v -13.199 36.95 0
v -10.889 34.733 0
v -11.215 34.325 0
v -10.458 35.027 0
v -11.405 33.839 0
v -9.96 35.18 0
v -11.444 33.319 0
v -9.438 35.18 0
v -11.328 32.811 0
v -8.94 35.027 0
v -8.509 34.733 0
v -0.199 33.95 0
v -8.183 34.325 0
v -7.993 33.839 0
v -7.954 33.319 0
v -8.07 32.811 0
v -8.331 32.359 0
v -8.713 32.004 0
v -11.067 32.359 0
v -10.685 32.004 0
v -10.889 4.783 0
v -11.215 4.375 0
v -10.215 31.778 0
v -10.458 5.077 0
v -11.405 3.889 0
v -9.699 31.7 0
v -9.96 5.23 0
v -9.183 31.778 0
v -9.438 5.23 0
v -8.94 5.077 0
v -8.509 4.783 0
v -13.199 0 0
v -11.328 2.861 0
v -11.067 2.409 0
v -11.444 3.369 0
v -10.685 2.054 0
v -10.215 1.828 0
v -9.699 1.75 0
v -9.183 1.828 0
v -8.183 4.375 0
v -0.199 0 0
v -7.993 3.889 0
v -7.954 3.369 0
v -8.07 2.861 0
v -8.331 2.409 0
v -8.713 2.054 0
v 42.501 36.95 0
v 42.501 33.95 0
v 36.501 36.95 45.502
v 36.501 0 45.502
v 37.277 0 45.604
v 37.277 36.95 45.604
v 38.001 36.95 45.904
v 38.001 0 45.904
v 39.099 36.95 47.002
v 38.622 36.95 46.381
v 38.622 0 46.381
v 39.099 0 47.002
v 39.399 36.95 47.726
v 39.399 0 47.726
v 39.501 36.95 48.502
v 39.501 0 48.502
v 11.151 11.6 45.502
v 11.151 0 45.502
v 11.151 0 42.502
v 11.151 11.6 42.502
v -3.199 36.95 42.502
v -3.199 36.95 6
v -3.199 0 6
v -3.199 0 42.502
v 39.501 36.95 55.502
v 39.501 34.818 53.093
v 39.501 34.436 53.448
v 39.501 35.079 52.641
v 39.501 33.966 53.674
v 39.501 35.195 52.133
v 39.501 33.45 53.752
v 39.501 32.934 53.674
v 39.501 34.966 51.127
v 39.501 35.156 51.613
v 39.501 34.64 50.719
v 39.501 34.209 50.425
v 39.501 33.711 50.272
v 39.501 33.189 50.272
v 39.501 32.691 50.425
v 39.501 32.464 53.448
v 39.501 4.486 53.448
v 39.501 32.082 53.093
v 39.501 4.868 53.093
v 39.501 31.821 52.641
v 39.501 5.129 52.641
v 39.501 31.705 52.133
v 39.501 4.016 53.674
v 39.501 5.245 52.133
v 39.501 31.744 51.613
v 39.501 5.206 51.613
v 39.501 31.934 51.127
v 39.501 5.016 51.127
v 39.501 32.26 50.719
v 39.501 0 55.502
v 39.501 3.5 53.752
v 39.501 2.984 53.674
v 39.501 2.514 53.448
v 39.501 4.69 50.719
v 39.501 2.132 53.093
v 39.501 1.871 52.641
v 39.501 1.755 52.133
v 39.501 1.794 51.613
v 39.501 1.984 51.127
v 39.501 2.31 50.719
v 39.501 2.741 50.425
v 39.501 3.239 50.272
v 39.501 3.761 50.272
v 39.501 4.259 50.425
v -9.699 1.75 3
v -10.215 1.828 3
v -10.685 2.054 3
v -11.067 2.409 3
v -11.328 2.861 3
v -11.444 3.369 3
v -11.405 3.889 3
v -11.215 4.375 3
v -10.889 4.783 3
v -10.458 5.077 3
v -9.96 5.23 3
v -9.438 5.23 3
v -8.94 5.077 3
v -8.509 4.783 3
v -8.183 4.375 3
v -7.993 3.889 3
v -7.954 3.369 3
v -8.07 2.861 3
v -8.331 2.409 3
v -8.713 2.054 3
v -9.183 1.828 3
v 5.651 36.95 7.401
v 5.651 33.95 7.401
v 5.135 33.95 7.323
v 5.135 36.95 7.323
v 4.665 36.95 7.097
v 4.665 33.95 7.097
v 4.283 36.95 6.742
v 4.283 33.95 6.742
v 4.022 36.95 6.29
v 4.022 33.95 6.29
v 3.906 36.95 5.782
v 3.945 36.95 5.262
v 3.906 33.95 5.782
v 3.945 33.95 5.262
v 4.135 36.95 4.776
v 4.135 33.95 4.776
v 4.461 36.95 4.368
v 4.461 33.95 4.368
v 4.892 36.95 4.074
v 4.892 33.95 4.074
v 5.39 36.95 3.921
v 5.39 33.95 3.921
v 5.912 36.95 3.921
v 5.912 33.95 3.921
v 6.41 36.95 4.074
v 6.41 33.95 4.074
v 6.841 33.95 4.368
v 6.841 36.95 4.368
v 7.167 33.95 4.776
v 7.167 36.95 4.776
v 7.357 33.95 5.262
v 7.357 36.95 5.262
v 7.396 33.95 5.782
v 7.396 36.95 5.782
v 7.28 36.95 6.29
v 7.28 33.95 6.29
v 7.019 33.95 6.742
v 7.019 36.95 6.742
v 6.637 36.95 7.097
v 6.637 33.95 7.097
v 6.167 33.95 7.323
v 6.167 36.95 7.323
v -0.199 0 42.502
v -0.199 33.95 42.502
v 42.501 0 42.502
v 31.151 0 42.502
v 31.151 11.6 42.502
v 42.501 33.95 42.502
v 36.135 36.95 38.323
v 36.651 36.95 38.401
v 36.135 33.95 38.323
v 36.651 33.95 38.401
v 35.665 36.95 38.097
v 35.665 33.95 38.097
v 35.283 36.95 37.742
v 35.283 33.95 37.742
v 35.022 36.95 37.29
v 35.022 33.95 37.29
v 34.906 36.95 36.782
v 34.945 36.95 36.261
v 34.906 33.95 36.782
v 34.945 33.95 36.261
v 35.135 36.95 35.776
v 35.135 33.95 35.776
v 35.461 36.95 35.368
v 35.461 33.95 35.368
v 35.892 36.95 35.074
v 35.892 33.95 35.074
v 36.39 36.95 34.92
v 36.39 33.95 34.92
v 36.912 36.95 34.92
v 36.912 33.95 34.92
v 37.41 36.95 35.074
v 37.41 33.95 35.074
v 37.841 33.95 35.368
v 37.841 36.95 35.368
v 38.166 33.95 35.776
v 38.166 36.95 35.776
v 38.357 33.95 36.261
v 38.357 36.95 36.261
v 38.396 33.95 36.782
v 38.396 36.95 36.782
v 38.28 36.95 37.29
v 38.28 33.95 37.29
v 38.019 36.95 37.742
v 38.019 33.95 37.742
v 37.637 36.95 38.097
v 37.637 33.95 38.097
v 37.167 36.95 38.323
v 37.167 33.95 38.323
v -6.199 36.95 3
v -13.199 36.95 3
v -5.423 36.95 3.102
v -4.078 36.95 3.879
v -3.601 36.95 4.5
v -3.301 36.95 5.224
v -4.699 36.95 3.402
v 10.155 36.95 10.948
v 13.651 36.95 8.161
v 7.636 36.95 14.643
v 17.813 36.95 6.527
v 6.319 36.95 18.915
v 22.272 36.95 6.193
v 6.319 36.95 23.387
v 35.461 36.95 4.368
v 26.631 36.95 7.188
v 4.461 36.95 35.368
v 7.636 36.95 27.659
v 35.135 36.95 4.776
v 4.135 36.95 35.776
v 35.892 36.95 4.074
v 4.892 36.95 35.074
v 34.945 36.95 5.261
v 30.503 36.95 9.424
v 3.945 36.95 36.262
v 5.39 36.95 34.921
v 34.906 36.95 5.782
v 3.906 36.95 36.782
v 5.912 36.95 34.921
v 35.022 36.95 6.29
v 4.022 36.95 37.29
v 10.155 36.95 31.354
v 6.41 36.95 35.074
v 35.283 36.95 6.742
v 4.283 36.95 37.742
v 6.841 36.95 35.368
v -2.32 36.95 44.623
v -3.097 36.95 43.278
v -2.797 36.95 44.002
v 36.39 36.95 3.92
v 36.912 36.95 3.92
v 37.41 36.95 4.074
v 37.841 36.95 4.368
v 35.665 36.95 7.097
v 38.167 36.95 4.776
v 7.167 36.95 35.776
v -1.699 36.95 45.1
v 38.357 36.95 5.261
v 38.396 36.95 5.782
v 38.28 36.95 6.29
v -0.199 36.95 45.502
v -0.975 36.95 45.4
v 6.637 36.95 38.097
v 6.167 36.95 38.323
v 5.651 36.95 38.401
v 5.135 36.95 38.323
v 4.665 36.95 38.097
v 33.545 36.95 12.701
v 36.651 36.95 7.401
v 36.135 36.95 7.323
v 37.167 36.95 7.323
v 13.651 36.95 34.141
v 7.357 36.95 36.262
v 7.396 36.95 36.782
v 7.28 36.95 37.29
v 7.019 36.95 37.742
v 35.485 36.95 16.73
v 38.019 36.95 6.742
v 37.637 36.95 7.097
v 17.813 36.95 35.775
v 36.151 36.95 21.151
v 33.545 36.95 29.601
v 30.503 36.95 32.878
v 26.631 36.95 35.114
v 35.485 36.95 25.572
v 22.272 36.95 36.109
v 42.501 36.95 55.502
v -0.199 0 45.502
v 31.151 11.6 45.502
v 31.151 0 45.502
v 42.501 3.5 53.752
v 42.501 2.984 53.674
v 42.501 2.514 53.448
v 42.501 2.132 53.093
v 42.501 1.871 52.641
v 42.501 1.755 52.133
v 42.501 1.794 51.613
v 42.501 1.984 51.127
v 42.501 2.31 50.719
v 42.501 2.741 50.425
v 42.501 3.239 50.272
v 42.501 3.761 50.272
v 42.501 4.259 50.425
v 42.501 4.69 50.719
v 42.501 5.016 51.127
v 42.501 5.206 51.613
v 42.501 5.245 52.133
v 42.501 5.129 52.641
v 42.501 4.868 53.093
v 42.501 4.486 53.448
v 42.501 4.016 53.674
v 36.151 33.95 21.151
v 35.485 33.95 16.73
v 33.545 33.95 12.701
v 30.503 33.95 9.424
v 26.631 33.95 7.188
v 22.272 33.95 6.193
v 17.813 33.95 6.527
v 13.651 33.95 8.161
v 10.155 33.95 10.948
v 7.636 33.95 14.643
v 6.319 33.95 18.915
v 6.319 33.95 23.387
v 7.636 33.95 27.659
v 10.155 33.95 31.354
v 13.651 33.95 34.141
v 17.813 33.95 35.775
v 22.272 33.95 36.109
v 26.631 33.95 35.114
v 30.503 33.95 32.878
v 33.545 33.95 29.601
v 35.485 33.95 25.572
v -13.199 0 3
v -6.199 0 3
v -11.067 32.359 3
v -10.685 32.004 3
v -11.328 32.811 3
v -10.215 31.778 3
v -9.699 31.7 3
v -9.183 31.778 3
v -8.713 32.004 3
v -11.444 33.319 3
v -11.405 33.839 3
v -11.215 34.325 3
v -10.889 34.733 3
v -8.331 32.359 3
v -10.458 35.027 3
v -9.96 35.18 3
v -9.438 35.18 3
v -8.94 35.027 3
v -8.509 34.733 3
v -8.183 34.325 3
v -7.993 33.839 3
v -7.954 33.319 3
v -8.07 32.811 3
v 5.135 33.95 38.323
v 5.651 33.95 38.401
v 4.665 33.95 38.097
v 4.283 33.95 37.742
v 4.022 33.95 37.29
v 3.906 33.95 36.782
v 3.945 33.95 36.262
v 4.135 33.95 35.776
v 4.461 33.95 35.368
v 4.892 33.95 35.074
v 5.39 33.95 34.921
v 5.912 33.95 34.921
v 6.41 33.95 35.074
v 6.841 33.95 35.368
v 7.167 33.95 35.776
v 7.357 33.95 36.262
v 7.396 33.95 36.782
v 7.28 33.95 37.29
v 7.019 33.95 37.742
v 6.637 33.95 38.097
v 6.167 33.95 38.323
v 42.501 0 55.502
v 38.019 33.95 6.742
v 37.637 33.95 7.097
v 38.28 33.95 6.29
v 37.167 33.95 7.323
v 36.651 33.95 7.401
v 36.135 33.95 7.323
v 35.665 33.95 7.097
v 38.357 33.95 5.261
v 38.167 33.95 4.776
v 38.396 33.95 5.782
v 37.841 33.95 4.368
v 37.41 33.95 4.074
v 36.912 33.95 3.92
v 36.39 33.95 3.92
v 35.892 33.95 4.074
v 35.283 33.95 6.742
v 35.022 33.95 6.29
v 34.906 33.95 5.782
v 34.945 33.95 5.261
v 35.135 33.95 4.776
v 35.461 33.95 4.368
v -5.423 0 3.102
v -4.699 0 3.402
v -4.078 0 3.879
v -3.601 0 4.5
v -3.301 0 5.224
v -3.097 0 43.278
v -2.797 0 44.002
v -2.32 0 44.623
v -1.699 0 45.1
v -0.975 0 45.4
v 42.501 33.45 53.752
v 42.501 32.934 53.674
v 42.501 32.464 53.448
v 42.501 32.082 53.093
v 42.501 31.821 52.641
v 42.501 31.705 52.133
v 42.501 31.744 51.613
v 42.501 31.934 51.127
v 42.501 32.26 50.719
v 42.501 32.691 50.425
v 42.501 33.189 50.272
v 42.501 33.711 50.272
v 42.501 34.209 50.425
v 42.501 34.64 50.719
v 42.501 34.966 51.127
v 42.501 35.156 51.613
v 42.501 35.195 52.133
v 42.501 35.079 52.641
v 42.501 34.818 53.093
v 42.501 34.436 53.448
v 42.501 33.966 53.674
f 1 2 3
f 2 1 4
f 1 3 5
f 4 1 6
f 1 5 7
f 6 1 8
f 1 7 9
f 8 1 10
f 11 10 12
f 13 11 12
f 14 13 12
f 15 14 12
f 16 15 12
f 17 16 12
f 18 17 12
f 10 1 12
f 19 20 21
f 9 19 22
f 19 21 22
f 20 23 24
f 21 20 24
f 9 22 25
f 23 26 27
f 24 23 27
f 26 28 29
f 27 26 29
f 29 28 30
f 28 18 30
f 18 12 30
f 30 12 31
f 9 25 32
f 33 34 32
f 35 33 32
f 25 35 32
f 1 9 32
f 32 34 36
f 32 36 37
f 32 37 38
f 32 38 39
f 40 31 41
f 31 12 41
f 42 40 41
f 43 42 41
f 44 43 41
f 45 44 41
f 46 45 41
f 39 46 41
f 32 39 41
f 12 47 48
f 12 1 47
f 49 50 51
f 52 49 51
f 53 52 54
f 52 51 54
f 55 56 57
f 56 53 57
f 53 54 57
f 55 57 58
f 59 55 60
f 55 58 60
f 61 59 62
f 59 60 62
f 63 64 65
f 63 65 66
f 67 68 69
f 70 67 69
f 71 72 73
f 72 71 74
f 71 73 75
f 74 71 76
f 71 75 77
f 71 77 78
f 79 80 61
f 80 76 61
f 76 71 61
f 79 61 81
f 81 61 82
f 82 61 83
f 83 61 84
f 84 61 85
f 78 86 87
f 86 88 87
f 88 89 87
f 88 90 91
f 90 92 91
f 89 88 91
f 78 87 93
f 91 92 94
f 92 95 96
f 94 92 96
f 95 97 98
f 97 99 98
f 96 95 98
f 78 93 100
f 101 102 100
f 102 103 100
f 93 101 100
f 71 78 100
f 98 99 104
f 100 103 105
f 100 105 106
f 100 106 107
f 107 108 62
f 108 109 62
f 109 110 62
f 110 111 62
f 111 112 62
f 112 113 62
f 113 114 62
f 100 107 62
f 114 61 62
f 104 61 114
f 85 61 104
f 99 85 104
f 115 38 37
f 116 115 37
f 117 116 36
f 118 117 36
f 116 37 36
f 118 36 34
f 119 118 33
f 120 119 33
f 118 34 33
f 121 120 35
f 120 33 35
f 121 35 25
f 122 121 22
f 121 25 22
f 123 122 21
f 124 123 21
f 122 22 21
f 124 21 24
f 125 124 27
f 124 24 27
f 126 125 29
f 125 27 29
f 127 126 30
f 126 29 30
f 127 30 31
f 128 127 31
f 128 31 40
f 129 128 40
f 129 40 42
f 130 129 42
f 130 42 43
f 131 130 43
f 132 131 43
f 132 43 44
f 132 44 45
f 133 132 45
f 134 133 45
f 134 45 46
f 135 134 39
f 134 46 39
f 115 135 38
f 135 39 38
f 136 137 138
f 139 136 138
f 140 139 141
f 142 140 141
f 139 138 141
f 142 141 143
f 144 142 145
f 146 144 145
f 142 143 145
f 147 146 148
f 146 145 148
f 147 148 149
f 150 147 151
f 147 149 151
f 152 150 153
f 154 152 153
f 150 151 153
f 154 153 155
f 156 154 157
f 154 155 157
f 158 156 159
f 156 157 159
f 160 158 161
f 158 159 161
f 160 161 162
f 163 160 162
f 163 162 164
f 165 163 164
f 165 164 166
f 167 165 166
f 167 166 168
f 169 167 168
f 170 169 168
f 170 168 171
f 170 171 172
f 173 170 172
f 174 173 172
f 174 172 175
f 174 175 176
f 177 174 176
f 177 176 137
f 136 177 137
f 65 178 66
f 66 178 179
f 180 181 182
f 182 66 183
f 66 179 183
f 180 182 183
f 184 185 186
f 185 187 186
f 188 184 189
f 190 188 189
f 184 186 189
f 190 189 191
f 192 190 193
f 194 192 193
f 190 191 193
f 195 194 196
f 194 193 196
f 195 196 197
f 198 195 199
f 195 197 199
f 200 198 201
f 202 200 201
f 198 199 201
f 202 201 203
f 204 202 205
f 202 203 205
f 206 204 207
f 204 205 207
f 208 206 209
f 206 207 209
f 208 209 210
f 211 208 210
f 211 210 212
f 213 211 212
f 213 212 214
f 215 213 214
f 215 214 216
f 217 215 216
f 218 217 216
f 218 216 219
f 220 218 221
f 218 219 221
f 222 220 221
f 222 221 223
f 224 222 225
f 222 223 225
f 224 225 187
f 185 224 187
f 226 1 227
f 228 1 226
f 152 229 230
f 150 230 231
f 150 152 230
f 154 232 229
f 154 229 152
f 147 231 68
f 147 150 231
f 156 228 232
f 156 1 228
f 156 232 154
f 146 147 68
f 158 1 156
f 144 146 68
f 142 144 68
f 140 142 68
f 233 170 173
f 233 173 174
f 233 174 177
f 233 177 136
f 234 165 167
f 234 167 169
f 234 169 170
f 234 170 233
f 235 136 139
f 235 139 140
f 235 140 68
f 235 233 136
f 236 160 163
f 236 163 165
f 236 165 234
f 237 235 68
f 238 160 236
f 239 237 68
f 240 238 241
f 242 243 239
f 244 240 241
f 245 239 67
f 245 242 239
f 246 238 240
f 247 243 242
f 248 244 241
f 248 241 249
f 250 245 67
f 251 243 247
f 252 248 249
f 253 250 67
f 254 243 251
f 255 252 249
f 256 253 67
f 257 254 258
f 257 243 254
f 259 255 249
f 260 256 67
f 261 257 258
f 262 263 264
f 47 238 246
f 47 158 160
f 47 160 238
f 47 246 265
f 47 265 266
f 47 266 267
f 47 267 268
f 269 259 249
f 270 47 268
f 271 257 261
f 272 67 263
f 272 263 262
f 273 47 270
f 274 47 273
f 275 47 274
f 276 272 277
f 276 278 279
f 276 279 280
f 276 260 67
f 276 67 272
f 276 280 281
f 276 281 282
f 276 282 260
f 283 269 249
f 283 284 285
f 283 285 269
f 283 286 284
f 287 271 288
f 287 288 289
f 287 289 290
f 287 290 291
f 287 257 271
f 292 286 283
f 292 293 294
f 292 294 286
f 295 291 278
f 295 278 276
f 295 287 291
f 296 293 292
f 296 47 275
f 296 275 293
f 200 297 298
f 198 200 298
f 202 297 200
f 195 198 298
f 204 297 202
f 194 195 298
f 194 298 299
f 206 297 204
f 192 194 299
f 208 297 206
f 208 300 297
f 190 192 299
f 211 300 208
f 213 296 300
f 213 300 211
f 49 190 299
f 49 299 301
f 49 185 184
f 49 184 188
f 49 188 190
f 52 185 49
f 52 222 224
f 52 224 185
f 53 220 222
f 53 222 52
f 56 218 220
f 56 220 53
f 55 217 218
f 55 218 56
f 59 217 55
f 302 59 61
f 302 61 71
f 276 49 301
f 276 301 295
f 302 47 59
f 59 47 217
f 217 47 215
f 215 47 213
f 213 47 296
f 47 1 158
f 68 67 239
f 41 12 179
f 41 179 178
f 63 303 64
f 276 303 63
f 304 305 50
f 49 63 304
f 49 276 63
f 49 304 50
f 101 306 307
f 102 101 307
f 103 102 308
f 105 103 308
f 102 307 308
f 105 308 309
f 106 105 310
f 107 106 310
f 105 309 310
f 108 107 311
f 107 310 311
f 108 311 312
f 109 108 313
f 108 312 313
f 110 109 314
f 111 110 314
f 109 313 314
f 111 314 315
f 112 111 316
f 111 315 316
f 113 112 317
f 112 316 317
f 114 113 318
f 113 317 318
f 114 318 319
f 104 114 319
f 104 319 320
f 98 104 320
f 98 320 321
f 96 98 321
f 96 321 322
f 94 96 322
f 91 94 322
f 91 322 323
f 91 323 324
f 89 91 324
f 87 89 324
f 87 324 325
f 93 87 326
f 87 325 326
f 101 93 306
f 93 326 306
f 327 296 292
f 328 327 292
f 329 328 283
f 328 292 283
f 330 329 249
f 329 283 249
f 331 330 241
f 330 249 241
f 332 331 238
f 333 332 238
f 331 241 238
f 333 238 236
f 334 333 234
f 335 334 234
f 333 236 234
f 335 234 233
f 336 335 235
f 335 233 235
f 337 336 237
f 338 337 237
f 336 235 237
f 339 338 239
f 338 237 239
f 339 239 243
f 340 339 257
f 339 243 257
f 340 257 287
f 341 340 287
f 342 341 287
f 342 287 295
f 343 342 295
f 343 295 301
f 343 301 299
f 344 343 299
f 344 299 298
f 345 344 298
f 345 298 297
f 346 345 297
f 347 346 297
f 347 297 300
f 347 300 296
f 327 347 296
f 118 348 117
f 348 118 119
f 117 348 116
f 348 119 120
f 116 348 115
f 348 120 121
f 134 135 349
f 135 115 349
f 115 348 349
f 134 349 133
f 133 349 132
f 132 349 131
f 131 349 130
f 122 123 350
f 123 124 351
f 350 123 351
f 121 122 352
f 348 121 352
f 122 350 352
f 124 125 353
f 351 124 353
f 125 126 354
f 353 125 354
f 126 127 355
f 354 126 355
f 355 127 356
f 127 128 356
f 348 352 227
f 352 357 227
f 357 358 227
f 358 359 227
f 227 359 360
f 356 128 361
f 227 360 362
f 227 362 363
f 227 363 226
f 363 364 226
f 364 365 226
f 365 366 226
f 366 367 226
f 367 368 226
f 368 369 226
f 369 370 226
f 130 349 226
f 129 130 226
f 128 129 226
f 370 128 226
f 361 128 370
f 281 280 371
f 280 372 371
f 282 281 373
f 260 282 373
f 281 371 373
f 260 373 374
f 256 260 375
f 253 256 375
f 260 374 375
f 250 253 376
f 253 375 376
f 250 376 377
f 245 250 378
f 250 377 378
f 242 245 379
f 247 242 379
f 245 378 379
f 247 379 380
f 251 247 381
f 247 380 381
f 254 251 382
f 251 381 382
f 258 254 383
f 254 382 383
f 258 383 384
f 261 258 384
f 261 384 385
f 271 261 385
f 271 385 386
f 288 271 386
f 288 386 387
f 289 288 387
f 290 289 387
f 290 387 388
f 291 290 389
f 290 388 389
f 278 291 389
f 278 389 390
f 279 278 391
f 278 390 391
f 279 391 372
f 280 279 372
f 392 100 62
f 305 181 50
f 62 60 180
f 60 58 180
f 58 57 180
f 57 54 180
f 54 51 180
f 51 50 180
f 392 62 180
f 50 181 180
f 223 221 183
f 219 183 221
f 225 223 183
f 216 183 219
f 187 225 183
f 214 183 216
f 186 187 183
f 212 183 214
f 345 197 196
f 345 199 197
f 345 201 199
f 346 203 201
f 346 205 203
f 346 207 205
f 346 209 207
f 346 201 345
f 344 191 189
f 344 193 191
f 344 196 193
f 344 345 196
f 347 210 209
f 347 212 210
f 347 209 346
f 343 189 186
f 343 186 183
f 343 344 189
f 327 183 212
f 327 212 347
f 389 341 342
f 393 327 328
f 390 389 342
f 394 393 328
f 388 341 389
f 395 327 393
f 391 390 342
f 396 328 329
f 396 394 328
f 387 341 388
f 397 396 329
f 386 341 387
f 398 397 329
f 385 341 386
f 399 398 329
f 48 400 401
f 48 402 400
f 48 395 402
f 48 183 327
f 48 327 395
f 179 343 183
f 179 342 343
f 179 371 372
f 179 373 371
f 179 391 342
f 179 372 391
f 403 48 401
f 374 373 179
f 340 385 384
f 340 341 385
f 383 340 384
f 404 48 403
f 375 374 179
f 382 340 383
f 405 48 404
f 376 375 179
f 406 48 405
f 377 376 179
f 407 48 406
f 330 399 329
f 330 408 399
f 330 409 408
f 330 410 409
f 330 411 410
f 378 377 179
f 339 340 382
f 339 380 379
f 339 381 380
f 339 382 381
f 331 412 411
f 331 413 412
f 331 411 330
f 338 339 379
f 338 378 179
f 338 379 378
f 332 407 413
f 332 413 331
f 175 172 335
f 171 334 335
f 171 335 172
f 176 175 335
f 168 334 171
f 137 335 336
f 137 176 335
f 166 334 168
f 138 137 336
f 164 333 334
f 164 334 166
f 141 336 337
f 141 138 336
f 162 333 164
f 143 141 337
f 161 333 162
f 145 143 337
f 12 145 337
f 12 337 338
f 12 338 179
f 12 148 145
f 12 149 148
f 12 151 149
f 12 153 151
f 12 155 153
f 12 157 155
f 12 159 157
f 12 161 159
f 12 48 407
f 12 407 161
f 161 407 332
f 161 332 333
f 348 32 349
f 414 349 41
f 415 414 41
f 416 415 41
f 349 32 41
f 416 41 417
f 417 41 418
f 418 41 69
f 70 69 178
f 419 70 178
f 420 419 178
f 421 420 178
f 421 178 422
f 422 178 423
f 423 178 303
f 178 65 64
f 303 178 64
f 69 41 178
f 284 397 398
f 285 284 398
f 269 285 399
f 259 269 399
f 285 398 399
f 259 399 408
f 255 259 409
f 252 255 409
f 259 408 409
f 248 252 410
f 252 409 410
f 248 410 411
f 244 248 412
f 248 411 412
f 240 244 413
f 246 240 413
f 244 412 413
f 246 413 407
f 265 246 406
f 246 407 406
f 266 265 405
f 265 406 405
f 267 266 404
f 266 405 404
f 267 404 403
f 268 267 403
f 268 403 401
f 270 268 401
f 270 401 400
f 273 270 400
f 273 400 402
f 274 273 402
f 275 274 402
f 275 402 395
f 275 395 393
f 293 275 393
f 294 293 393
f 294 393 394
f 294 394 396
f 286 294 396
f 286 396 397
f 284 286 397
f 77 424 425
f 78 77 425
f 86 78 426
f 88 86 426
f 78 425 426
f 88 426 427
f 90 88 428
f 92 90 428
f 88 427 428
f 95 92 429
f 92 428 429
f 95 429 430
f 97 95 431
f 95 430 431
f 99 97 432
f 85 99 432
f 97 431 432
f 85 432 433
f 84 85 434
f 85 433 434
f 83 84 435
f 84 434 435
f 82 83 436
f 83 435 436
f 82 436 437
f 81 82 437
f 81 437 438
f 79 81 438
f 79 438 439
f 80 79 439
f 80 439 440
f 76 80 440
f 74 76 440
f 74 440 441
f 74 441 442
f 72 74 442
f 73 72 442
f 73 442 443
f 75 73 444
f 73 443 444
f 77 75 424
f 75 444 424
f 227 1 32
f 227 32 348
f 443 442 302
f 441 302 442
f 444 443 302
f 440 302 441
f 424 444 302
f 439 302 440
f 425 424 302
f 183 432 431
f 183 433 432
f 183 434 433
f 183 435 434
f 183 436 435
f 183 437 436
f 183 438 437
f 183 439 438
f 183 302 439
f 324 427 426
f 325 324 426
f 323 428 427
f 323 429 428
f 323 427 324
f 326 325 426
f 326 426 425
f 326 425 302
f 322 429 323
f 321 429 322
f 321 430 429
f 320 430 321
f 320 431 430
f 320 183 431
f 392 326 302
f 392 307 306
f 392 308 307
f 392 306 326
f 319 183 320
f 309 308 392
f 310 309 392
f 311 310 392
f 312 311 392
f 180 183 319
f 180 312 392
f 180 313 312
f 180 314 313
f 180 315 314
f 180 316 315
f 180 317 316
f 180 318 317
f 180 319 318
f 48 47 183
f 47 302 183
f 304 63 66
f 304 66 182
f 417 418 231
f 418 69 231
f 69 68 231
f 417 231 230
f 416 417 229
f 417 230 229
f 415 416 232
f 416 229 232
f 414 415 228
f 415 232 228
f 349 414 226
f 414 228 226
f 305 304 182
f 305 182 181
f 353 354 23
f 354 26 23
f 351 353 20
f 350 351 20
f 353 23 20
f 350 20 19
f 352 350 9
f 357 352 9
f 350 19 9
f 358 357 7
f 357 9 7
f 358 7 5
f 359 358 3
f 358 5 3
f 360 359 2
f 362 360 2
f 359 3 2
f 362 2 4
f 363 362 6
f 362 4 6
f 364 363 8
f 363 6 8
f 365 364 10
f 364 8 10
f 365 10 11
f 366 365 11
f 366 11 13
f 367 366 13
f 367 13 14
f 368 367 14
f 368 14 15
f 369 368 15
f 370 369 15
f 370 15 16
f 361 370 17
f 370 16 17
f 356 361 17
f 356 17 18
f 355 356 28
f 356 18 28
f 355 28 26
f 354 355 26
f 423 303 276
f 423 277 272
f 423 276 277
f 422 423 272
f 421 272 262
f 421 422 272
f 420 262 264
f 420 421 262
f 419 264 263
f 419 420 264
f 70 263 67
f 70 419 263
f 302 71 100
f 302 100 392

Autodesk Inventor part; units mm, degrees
ref_plane "YZ Plane" through (0, 0, 0) normal (1, 0, 0) x (0, 1, 0)
ref_plane "XZ Plane" through (0, 0, 0) normal (0, 1, 0) x (-1, 0, 0)
ref_plane "XY Plane" through (0, 0, 0) normal (0, 0, 1) x (1, 0, 0)
sketch "Boceto1" plane through (0, 0, 0) normal (0, 0, 1) x (1, 0, 0)
  line L0 (42.301, 0) -> (42.301, 9.6) projected
  line L1 (42.302, 9.6) -> (42.302, 26.1) projected
  line L2 (42.301, 26.1) -> (42.301, 33.75) projected
  line L3 (38.301, 0) -> (42.301, 0) projected
  line L4 (4.001, 33.75) -> (38.301, 33.75) projected
  line L5 (38.301, 33.75) -> (42.301, 33.75) projected
  line L6 (0.001, 33.75) -> (4.001, 33.75) projected
  line L7 (0.001, 26.1) -> (0.001, 33.75) projected
  line L8 (0.001, 9.6) -> (0.001, 26.1) projected
  line L9 (0.001, 0) -> (0.001, 9.6) projected
  line L10 (42.301, 33.75) -> (0.001, 33.75)
  line L11 (0.001, 33.75) -> (0.001, 0)
  line L12 (0.001, 0) -> (42.301, 0)
  line L13 (42.301, 0) -> (42.301, 33.75)
  line L14 (42.501, 33.95) -> (-0.199, 33.95)
  line L15 (-0.199, 33.95) -> (-0.199, -0.2)
  line L16 (-0.199, -0.2) -> (42.501, -0.2)
  line L17 (42.501, -0.2) -> (42.501, 33.95)
  line L18 (42.501, 36.95) -> (-3.199, 36.95)
  line L19 (-3.199, 36.95) -> (-3.199, 0)
  line L20 (-3.199, -3.2) -> (45.501, -3.2)
  line L21 (45.501, 0) -> (45.501, 36.95)
  line L22 (42.301, 0) -> (45.501, 0)
  line L23 (0.001, 0) -> (-3.199, 0)
  line L24 (42.501, 33.95) -> (42.501, 36.95)
  point P0 (0, 0)
  point P1 (-0.199, 0)
  dimension "d0" = 0.2
  dimension "d1" = 3
extrude "Extrusión1" add sketch "Boceto1" along normal blind 45.502 contours L14 L15 L23 L19 L18 L24
sketch "Boceto2" plane through (-0.199, 33.95, 0) normal (0, -1, 0) x (1, 0, 0)
  line L0 (0, 0) -> (42.7, 0) projected
  line L1 (42.7, 0) -> (42.7, 45.502) projected
  line L2 (0, 45.502) -> (42.7, 45.502) projected
  line L3 (0, 0) -> (0, 45.502) projected
  line L4 (42.7, 45.502) -> (0, 45.502)
  line L5 (0, 45.502) -> (0, 42.502)
  line L6 (0, 42.502) -> (42.7, 42.502)
  line L7 (42.7, 42.502) -> (42.7, 45.502)
  point P0 (0.199, 0)
  dimension "d4" = 3
extrude "Extrusión2" add sketch "Boceto2" along normal up to surface (33.95 mm away) contours L3 L2 L1 L6
sketch "Boceto3" plane through (0, 0, 45.502) normal (0, 0, 1) x (1, 0, 0)
  line L0 (-3.199, 0) -> (42.501, 0) projected
  line L1 (42.501, 36.95) -> (42.501, 0) projected
  line L2 (42.501, 36.95) -> (-3.199, 36.95) projected
  line L3 (-3.199, 36.95) -> (-3.199, 0) projected
  line L4 (-6.5037, 43.25) -> (-6.5037, 58.25) projected
  line L5 (-6.5037, 43.25) -> (-6.5037, 58.25) projected
  line L6 (29.151, 9.6) -> (29.151, 3.2) projected
  line L7 (29.151, 0) -> (29.151, 3.2) projected
  line L8 (13.651, 3.6) -> (13.651, 9.1) projected
  line L9 (13.151, 3.2) -> (13.151, 0) projected
  line L10 (13.151, 9.6) -> (13.151, 3.2) projected
  line L11 (29.151, 9.6) -> (13.151, 9.6) projected
  line L12 (11.151, 0) -> (11.151, 3.2)
  line L13 (11.151, 3.2) -> (11.151, 11.6)
  line L14 (11.151, 11.6) -> (31.151, 11.6)
  line L15 (31.151, 11.6) -> (31.151, 3.2)
  line L16 (31.151, 3.2) -> (31.151, 0)
  point P0 (0, 0)
  point P1 (-15.9908, 43.25)
  dimension "d7" = 2
extrude "Extrusión3" cut sketch "Boceto3" against normal blind 10 contours L12 L13 L14 L15 L16 L0 L7 L6 L11 L10 L9 | L9 L10 L11 L6 L7 L0
sketch "Boceto4" plane through (-3.199, 36.95, 0) normal (0, 1, 0) x (1, 0, 0)
  circle A0 centre (24.35, -21.151) radius 2.5 projected
  circle A1 centre (24.35, -21.151) radius 15
  point P0 (3.199, 0)
  dimension "d10" = 30
extrude "Extrusión4" cut sketch "Boceto4" against normal blind 10 contours A0 | A1
sketch "Boceto5" plane through (-3.199, 36.95, 0) normal (0, 1, 0) x (1, 0, 0)
  circle A0 centre (24.35, -21.151) radius 15 projected
  line L0 (45.7, 0) -> (0, 0) projected
  line L1 (0, 0) -> (0, -45.502) projected
  line L2 (45.7, -45.502) -> (0, -45.502) projected
  line L3 (45.7, 0) -> (45.7, -45.502) projected
  circle A1 centre (24.35, -21.151) radius 15 projected
  line L4 (45.7, -42.502) -> (3, -42.502) projected
  line L5 (3, 0) -> (3, -42.502) projected
  line L6 (3, 0) -> (45.7, 0) projected
  line L7 (45.7, 0) -> (45.7, -42.502) projected
  circle A2 centre (8.85, -36.651) radius 1.5 projected
  circle A3 centre (8.85, -5.651) radius 1.5 projected
  circle A4 centre (39.85, -5.6509) radius 1.5001 projected
  circle A5 centre (39.8499, -36.6509) radius 1.4998 projected
  circle A6 centre (39.8499, -36.6509) radius 2
  circle A7 centre (39.85, -5.6509) radius 2
  circle A8 centre (8.85, -5.651) radius 2
  circle A9 centre (8.85, -36.651) radius 2
  point P0 (3.199, 0)
  dimension "d13" = 4
  dimension "d14" = 4
  dimension "d15" = 4
  dimension "d16" = 4
hole "Agujero1" at (5.651, 36.95, 36.651) at (5.651, 36.95, 5.651) at (36.651, 36.95, 5.6509) at (36.6509, 36.95, 36.6509) direction (0, -1, 0) diameter 3.5 end through all
sketch "Boceto6" plane through (0, 0, 45.502) normal (0, 0, 1) x (1, 0, 0)
  line L0 (31.151, 11.6) -> (31.151, 0) projected
  line L1 (31.151, 0) -> (42.501, 0) projected
  line L2 (42.501, 36.95) -> (42.501, 0) projected
  line L3 (42.501, 36.95) -> (-3.199, 36.95) projected
  line L4 (-3.199, 36.95) -> (-3.199, 0) projected
  line L5 (-3.199, 0) -> (11.151, 0) projected
  line L6 (11.151, 0) -> (11.151, 11.6) projected
  line L7 (11.151, 11.6) -> (31.151, 11.6) projected
  line L8 (42.501, 36.95) -> (39.501, 36.95)
  line L9 (39.501, 36.95) -> (39.501, 0)
  line L10 (39.501, 0) -> (42.501, 0)
  line L11 (42.501, 0) -> (42.501, 36.95)
  point P0 (0, 0)
  dimension "d24" = 3
extrude "Extrusión5" add sketch "Boceto6" along normal blind 10 contours L9 L3 L2 L1
fillet "Empalme1" radius 3 1 edges at (39.501, 18.475, 45.502)
sketch "Boceto7" plane through (39.501, 0, 55.502) normal (-1, 0, 0) x (0, 0, 1)
  line L0 (-7, 0) -> (-7, 36.95) projected
  line L1 (-7, 0) -> (0, 0) projected
  line L2 (0, 36.95) -> (0, 0) projected
  line L3 (-7, 36.95) -> (0, 36.95) projected
  line L4 (-7, 36.95) -> (0, 36.95)
  line L5 (0, 36.95) -> (0, 29.95)
  line L6 (0, 29.95) -> (-7, 29.95)
  line L7 (-7, 29.95) -> (-7, 36.95)
  line L8 (-55.502, 36.95) -> (0, 36.95) projected
  line L9 (-7, 29.95) -> (0, 36.95)
  circle A0 centre (-3.5, 33.45) radius 2
  line L10 (-7, 0) -> (0, 0)
  line L11 (0, 0) -> (0, 7)
  line L12 (0, 7) -> (-7, 7)
  line L13 (-7, 7) -> (-7, 0)
  line L14 (-7, 0) -> (0, 7)
  circle A1 centre (-3.5, 3.5) radius 2
  point P0 (-55.502, 0)
  dimension "d28" = 7
  dimension "d29" = 4
  dimension "d30" = 7
  dimension "d31" = 7
  dimension "d32" = 4
hole "Agujero2" at (39.501, 33.45, 52.002) at (39.501, 3.5, 52.002) direction (1, 0, 0) diameter 3.5 end through all
sketch "Boceto8" plane through (-3.199, 0, 0) normal (-1, 0, 0) x (0, 0, 1)
  line L0 (0, 36.95) -> (0, 0) projected
  line L1 (0, 0) -> (45.502, 0) projected
  line L2 (45.502, 36.95) -> (45.502, 0) projected
  line L3 (0, 36.95) -> (45.502, 36.95) projected
  line L4 (0, 0) -> (3, 0)
  line L5 (3, 0) -> (3, 36.95)
  line L6 (3, 36.95) -> (0, 36.95)
  line L7 (0, 36.95) -> (0, 0)
  point P0 (0, 0)
  dimension "d40" = 3
extrude "Extrusión6" add sketch "Boceto8" along normal blind 10 contours L3 L5 L1 L0
fillet "Empalme2" radius 3 1 edges at (-3.199, 18.475, 3)
sketch "Boceto9" plane through (-13.199, 0, 3) normal (0, 0, 1) x (1, 0, 0)
  line L0 (7, 36.95) -> (7, 0) projected
  line L1 (7, 36.95) -> (0, 36.95) projected
  line L2 (0, 0) -> (0, 36.95) projected
  line L3 (7, 0) -> (0, 0) projected
  line L4 (0, 36.95) -> (7, 36.95)
  line L5 (7, 36.95) -> (7, 29.95)
  line L6 (7, 29.95) -> (0, 29.95)
  line L7 (0, 29.95) -> (0, 36.95)
  line L8 (0, 0) -> (7, 0)
  line L9 (7, 0) -> (7, 7)
  line L10 (7, 7) -> (0, 7)
  line L11 (0, 7) -> (0, 0)
  line L12 (0, 29.95) -> (7, 36.95)
  line L13 (0, 7) -> (7, 0)
  circle A0 centre (3.5, 33.45) radius 1.75
  circle A1 centre (3.5, 3.5) radius 1.75
  point P0 (13.199, 0)
  dimension "d44" = 7
  dimension "d45" = 7
  dimension "d46" = 7
  dimension "d47" = 3.5
  dimension "d48" = 3.5
hole "Agujero3" at (-9.699, 33.45, 3) at (-9.699, 3.5, 3) direction (0, 0, -1) diameter 3.5 end through all
fillet "Empalme3" radius 3 1 edges at (-3.199, 18.475, 45.502)
properties part number "Soporte Motor"
